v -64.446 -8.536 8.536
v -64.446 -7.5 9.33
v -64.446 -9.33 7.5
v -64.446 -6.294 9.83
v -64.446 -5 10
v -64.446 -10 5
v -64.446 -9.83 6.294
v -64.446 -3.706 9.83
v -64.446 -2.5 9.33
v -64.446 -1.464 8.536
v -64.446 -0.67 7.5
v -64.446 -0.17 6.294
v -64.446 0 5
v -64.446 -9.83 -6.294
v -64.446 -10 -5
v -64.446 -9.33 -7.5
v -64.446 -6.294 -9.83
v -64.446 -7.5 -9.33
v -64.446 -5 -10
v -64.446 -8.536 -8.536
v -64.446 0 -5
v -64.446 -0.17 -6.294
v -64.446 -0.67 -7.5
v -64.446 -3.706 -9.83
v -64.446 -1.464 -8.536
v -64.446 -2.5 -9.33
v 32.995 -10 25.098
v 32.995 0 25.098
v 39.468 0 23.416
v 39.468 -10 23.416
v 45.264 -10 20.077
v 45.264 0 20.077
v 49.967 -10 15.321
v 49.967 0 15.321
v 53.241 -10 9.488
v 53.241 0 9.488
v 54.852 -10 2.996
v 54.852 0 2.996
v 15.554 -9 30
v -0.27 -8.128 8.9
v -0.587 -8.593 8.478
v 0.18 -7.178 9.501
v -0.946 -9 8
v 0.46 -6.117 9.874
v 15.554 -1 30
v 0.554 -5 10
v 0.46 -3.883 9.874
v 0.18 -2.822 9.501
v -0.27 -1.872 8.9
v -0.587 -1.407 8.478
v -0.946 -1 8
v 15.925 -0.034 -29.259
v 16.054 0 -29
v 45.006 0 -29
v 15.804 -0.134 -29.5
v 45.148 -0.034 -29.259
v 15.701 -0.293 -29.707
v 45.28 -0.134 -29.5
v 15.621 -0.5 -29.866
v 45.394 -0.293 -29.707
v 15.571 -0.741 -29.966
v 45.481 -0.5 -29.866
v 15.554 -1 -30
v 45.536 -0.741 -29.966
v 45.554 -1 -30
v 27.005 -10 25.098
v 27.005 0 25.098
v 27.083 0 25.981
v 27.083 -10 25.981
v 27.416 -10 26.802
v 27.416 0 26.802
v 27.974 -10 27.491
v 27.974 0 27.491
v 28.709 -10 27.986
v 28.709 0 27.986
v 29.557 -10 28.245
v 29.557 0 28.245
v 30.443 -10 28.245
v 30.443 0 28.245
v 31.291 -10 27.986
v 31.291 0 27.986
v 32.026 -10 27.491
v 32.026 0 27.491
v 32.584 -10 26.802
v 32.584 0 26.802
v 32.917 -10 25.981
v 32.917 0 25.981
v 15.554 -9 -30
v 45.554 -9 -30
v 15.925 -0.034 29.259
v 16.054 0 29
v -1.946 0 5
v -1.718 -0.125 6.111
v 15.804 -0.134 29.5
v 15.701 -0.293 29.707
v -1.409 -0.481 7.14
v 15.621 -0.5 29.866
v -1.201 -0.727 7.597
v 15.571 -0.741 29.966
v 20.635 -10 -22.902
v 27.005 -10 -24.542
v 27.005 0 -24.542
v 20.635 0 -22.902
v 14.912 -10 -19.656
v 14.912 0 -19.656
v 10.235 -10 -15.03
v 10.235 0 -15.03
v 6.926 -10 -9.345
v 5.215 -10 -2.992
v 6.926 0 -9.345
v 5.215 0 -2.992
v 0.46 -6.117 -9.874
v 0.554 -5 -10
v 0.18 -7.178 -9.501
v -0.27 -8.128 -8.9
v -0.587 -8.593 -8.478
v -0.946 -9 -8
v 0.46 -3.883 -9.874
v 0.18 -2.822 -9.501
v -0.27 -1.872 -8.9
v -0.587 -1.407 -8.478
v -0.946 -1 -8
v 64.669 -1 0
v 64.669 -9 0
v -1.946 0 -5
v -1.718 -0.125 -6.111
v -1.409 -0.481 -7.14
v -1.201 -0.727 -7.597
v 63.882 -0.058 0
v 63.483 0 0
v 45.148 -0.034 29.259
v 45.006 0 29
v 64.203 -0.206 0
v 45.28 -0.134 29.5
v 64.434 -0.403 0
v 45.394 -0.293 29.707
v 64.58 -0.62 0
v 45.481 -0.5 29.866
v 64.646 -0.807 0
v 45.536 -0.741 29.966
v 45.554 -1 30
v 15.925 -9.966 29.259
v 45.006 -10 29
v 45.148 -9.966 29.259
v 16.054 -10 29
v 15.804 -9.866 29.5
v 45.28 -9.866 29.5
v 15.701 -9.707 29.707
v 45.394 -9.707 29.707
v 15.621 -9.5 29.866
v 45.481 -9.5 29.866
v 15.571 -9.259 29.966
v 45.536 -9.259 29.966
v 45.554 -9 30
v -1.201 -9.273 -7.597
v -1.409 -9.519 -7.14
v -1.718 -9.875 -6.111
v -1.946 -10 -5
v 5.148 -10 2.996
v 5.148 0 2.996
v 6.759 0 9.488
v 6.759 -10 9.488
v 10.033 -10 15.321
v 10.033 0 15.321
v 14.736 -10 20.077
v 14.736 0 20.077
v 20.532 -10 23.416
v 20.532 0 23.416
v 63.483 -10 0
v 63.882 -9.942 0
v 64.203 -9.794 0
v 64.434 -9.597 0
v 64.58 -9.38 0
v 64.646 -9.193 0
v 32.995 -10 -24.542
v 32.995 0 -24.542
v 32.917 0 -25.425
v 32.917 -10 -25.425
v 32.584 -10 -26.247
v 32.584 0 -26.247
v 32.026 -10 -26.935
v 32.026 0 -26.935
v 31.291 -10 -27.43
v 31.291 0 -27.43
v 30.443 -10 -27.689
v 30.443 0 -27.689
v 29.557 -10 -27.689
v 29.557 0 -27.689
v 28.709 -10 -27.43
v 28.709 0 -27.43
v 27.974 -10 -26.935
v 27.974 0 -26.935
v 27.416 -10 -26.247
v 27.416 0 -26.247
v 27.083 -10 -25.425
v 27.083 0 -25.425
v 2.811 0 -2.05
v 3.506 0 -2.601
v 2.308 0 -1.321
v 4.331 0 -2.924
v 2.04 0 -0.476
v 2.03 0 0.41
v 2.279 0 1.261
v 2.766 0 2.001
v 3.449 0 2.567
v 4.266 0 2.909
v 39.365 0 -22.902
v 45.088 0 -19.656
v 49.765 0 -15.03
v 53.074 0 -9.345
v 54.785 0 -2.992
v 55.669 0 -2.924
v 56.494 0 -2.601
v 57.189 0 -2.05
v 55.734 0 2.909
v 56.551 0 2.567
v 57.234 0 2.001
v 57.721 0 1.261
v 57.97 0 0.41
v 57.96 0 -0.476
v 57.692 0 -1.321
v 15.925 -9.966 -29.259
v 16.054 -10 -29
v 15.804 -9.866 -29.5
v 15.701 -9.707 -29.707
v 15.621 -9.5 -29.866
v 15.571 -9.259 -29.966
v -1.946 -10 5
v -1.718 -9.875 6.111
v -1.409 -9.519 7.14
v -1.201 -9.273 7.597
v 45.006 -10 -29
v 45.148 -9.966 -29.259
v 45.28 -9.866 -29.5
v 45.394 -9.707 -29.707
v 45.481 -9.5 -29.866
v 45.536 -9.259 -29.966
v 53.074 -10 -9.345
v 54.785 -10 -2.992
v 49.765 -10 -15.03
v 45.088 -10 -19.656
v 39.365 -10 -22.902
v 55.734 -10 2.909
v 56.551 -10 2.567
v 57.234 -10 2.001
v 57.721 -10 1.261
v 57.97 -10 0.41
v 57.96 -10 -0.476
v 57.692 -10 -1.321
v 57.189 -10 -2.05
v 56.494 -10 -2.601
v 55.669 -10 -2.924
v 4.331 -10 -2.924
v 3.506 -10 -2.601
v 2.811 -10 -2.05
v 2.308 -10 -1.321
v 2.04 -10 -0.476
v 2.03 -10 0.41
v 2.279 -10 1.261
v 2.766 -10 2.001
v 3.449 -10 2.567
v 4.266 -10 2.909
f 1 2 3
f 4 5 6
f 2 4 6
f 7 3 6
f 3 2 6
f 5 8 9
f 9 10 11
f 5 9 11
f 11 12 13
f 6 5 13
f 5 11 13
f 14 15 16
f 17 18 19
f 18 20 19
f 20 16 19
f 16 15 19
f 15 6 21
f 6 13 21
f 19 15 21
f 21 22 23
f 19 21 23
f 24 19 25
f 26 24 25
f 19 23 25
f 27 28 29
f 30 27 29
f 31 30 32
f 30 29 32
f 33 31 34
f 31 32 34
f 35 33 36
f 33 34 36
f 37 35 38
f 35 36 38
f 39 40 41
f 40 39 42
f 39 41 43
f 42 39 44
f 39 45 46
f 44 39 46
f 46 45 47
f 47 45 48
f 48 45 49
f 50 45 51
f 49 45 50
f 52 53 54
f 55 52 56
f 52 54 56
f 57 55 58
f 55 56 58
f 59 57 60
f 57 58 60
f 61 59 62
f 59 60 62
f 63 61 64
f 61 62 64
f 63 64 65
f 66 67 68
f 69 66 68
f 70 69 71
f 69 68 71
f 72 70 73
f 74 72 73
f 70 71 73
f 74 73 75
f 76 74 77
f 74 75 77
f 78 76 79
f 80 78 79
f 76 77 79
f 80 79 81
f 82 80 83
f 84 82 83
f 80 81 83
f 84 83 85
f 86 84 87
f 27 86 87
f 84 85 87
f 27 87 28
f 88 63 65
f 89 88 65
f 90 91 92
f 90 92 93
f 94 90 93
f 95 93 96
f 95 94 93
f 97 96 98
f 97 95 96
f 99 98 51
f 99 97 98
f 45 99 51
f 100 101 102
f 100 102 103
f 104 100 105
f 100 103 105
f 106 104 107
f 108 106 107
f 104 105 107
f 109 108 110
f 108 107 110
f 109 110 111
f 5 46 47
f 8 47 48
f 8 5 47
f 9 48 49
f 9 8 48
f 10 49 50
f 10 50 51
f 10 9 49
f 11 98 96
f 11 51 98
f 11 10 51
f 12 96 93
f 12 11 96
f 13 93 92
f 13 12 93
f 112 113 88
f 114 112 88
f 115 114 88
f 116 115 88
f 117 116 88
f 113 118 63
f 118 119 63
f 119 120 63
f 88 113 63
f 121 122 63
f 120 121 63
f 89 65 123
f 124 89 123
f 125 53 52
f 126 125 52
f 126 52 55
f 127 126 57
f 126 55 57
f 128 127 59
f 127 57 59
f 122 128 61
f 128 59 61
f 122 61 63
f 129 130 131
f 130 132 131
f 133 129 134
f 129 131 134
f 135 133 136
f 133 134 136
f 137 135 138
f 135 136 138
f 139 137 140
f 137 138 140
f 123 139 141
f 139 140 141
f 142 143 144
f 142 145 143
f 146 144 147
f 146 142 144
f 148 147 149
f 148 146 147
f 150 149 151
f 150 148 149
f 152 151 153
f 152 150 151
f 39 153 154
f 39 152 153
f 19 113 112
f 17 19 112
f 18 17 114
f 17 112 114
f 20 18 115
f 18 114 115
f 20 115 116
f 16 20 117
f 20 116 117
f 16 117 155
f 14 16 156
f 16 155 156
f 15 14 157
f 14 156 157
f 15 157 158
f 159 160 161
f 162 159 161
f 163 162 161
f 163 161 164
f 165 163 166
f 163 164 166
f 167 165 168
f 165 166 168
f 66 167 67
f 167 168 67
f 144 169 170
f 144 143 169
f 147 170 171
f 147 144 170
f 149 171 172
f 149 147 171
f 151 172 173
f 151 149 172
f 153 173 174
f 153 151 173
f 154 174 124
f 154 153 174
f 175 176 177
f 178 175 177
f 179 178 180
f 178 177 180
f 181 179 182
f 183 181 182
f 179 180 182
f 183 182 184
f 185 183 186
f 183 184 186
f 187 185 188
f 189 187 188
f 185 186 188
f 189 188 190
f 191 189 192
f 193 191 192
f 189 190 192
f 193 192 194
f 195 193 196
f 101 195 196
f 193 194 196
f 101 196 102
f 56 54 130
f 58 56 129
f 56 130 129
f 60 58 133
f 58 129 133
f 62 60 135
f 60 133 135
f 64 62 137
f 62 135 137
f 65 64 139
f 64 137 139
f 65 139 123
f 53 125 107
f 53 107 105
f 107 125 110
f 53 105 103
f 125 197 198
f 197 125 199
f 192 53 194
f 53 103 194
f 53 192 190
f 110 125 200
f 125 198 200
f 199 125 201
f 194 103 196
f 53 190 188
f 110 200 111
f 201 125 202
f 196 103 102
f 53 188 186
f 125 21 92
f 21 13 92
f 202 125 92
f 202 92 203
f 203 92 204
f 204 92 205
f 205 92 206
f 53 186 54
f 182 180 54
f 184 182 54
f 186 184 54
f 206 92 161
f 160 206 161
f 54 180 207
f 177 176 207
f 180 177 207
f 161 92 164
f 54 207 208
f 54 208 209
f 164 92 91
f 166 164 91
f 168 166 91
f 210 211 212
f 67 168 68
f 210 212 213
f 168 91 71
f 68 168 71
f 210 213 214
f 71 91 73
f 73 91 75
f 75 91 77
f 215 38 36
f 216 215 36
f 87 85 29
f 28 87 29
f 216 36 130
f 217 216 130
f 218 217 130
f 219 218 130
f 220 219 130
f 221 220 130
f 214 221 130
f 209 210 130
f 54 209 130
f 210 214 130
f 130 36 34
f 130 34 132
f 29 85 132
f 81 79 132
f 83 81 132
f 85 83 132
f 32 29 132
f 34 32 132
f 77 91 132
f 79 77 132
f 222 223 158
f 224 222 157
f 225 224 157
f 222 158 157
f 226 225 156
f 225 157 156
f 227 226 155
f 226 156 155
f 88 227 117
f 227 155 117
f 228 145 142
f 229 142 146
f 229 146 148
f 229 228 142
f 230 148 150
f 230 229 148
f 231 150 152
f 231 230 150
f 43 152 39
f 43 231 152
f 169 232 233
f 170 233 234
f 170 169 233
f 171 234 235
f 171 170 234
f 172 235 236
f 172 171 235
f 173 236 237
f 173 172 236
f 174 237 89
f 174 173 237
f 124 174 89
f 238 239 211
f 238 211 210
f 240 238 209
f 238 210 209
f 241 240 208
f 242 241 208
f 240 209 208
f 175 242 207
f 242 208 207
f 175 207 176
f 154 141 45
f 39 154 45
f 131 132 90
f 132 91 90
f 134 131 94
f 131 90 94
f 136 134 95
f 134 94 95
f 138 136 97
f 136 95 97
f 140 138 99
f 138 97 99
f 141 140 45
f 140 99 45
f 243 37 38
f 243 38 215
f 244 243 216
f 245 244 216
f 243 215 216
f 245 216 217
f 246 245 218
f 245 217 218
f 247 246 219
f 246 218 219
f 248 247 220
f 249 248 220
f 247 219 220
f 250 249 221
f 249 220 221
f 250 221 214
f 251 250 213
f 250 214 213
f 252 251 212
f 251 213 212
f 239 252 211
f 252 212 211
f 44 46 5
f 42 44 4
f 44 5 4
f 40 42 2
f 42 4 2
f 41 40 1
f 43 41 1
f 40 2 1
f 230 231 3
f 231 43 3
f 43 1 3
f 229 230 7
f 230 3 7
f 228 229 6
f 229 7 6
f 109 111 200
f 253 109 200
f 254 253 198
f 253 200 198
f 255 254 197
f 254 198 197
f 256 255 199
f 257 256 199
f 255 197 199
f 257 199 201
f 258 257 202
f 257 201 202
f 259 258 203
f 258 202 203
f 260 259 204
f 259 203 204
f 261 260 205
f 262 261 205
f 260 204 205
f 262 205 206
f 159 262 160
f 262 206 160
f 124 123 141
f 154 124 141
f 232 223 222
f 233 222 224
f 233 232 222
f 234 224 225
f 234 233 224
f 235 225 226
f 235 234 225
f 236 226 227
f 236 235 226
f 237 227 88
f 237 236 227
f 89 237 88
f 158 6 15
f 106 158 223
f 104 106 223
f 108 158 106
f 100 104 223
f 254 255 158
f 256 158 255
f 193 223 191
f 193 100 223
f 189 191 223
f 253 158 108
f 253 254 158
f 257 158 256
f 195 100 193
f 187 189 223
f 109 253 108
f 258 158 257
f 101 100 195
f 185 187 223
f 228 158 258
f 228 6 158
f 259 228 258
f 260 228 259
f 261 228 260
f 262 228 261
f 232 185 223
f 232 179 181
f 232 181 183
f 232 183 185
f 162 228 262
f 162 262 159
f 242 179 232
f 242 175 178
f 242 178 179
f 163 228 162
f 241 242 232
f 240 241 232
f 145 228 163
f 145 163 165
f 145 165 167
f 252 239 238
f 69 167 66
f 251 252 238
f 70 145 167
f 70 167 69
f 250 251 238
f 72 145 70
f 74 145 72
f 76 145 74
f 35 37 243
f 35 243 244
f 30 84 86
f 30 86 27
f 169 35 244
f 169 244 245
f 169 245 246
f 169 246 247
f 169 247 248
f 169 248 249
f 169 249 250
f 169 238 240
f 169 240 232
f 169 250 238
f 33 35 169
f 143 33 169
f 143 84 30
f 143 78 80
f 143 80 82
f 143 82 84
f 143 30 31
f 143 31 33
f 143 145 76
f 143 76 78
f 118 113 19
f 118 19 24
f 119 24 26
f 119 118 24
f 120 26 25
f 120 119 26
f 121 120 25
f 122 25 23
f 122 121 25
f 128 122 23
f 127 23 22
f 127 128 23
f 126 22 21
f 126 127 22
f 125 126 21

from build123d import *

# Parameters (mm, degrees)
F1_DEPTH = 10
F2_R     = 4.99999
F3_R     = 4.99999
F4_R     = 1
F5_R     = 1


# Not quite as in the source:
# - a fillet or chamfer is up to 0.001 mm smaller than in the source, because OpenCascade refuses the exact size


with BuildPart() as f1:
    # F0 (on Front) → F1 (new body)
    with BuildSketch(Plane.XZ):
        Polygon((0.5543106794, -10), (15.5543106794, -30), (45.5543106794, -30), (64.6686726809, 0), (45.5543106794, 30), (15.5543106794, 30), (0.5543106794, 10), (-64.4456893206, 10), (-64.4456893206, -10), align=None)
        with BuildLine():
            ThreePointArc((32.9945951312, 25.097839601), (47.7756292438, 17.8570035455), (54.8517478565, 2.9964106368))
            ThreePointArc((54.8517478565, 2.9964106368), (57.9982707821, -0.0333407521), (54.7851864872, -2.9924097466))
            ThreePointArc((54.7851864872, -2.9924097466), (47.5791639445, -17.4977896428), (32.9945951312, -24.542160399))
            ThreePointArc((32.9945951312, -24.542160399), (30, -27.722160399), (27.0054048688, -24.542160399))
            ThreePointArc((27.0054048688, -24.542160399), (12.4208360555, -17.4977896428), (5.2148135128, -2.9924097466))
            ThreePointArc((5.2148135128, -2.9924097466), (2.0017292179, -0.0333407521), (5.1482521435, 2.9964106368))
            ThreePointArc((5.1482521435, 2.9964106368), (12.2243707562, 17.8570035455), (27.0054048688, 25.097839601))
            ThreePointArc((27.0054048688, 25.097839601), (30, 28.277839601), (32.9945951312, 25.097839601))
        make_face(mode=Mode.SUBTRACT)
    extrude(amount=F1_DEPTH)

    # F2 (radius 5 in the source; OpenCascade refuses exactly that, so slightly less here)
    f2_edges = [f1.edges().sort_by_distance(p)[0] for p in [
        (-31.945689, -10, -10),
        (-31.945689, 0, -10),
    ]]
    fillet(f2_edges, radius=F2_R)

    # F3 (radius 5 in the source; OpenCascade refuses exactly that, so slightly less here)
    f3_edges = [f1.edges().sort_by_distance(p)[0] for p in [
        (-31.945689, 0, 10),
        (-31.945689, -10, 10),
    ]]
    fillet(f3_edges, radius=F3_R)

    # F4
    f4_edges = [f1.edges().sort_by_distance(p)[0] for p in [
        (8.054311, -10, 20),
        (30.554311, -10, 30),
        (55.111492, -10, 15),
        (55.111492, -10, -15),
        (30.554311, -10, -30),
        (8.054311, -10, -20),
    ]]
    fillet(f4_edges, radius=F4_R)

    # F5
    f5_edges = [f1.edges().sort_by_distance(p)[0] for p in [
        (30.554311, 0, 30),
        (55.111492, 0, 15),
        (55.111492, 0, -15),
        (30.554311, 0, -30),
        (8.054311, 0, -20),
        (8.054311, 0, 20),
    ]]
    fillet(f5_edges, radius=F5_R)


solid = f1.part
